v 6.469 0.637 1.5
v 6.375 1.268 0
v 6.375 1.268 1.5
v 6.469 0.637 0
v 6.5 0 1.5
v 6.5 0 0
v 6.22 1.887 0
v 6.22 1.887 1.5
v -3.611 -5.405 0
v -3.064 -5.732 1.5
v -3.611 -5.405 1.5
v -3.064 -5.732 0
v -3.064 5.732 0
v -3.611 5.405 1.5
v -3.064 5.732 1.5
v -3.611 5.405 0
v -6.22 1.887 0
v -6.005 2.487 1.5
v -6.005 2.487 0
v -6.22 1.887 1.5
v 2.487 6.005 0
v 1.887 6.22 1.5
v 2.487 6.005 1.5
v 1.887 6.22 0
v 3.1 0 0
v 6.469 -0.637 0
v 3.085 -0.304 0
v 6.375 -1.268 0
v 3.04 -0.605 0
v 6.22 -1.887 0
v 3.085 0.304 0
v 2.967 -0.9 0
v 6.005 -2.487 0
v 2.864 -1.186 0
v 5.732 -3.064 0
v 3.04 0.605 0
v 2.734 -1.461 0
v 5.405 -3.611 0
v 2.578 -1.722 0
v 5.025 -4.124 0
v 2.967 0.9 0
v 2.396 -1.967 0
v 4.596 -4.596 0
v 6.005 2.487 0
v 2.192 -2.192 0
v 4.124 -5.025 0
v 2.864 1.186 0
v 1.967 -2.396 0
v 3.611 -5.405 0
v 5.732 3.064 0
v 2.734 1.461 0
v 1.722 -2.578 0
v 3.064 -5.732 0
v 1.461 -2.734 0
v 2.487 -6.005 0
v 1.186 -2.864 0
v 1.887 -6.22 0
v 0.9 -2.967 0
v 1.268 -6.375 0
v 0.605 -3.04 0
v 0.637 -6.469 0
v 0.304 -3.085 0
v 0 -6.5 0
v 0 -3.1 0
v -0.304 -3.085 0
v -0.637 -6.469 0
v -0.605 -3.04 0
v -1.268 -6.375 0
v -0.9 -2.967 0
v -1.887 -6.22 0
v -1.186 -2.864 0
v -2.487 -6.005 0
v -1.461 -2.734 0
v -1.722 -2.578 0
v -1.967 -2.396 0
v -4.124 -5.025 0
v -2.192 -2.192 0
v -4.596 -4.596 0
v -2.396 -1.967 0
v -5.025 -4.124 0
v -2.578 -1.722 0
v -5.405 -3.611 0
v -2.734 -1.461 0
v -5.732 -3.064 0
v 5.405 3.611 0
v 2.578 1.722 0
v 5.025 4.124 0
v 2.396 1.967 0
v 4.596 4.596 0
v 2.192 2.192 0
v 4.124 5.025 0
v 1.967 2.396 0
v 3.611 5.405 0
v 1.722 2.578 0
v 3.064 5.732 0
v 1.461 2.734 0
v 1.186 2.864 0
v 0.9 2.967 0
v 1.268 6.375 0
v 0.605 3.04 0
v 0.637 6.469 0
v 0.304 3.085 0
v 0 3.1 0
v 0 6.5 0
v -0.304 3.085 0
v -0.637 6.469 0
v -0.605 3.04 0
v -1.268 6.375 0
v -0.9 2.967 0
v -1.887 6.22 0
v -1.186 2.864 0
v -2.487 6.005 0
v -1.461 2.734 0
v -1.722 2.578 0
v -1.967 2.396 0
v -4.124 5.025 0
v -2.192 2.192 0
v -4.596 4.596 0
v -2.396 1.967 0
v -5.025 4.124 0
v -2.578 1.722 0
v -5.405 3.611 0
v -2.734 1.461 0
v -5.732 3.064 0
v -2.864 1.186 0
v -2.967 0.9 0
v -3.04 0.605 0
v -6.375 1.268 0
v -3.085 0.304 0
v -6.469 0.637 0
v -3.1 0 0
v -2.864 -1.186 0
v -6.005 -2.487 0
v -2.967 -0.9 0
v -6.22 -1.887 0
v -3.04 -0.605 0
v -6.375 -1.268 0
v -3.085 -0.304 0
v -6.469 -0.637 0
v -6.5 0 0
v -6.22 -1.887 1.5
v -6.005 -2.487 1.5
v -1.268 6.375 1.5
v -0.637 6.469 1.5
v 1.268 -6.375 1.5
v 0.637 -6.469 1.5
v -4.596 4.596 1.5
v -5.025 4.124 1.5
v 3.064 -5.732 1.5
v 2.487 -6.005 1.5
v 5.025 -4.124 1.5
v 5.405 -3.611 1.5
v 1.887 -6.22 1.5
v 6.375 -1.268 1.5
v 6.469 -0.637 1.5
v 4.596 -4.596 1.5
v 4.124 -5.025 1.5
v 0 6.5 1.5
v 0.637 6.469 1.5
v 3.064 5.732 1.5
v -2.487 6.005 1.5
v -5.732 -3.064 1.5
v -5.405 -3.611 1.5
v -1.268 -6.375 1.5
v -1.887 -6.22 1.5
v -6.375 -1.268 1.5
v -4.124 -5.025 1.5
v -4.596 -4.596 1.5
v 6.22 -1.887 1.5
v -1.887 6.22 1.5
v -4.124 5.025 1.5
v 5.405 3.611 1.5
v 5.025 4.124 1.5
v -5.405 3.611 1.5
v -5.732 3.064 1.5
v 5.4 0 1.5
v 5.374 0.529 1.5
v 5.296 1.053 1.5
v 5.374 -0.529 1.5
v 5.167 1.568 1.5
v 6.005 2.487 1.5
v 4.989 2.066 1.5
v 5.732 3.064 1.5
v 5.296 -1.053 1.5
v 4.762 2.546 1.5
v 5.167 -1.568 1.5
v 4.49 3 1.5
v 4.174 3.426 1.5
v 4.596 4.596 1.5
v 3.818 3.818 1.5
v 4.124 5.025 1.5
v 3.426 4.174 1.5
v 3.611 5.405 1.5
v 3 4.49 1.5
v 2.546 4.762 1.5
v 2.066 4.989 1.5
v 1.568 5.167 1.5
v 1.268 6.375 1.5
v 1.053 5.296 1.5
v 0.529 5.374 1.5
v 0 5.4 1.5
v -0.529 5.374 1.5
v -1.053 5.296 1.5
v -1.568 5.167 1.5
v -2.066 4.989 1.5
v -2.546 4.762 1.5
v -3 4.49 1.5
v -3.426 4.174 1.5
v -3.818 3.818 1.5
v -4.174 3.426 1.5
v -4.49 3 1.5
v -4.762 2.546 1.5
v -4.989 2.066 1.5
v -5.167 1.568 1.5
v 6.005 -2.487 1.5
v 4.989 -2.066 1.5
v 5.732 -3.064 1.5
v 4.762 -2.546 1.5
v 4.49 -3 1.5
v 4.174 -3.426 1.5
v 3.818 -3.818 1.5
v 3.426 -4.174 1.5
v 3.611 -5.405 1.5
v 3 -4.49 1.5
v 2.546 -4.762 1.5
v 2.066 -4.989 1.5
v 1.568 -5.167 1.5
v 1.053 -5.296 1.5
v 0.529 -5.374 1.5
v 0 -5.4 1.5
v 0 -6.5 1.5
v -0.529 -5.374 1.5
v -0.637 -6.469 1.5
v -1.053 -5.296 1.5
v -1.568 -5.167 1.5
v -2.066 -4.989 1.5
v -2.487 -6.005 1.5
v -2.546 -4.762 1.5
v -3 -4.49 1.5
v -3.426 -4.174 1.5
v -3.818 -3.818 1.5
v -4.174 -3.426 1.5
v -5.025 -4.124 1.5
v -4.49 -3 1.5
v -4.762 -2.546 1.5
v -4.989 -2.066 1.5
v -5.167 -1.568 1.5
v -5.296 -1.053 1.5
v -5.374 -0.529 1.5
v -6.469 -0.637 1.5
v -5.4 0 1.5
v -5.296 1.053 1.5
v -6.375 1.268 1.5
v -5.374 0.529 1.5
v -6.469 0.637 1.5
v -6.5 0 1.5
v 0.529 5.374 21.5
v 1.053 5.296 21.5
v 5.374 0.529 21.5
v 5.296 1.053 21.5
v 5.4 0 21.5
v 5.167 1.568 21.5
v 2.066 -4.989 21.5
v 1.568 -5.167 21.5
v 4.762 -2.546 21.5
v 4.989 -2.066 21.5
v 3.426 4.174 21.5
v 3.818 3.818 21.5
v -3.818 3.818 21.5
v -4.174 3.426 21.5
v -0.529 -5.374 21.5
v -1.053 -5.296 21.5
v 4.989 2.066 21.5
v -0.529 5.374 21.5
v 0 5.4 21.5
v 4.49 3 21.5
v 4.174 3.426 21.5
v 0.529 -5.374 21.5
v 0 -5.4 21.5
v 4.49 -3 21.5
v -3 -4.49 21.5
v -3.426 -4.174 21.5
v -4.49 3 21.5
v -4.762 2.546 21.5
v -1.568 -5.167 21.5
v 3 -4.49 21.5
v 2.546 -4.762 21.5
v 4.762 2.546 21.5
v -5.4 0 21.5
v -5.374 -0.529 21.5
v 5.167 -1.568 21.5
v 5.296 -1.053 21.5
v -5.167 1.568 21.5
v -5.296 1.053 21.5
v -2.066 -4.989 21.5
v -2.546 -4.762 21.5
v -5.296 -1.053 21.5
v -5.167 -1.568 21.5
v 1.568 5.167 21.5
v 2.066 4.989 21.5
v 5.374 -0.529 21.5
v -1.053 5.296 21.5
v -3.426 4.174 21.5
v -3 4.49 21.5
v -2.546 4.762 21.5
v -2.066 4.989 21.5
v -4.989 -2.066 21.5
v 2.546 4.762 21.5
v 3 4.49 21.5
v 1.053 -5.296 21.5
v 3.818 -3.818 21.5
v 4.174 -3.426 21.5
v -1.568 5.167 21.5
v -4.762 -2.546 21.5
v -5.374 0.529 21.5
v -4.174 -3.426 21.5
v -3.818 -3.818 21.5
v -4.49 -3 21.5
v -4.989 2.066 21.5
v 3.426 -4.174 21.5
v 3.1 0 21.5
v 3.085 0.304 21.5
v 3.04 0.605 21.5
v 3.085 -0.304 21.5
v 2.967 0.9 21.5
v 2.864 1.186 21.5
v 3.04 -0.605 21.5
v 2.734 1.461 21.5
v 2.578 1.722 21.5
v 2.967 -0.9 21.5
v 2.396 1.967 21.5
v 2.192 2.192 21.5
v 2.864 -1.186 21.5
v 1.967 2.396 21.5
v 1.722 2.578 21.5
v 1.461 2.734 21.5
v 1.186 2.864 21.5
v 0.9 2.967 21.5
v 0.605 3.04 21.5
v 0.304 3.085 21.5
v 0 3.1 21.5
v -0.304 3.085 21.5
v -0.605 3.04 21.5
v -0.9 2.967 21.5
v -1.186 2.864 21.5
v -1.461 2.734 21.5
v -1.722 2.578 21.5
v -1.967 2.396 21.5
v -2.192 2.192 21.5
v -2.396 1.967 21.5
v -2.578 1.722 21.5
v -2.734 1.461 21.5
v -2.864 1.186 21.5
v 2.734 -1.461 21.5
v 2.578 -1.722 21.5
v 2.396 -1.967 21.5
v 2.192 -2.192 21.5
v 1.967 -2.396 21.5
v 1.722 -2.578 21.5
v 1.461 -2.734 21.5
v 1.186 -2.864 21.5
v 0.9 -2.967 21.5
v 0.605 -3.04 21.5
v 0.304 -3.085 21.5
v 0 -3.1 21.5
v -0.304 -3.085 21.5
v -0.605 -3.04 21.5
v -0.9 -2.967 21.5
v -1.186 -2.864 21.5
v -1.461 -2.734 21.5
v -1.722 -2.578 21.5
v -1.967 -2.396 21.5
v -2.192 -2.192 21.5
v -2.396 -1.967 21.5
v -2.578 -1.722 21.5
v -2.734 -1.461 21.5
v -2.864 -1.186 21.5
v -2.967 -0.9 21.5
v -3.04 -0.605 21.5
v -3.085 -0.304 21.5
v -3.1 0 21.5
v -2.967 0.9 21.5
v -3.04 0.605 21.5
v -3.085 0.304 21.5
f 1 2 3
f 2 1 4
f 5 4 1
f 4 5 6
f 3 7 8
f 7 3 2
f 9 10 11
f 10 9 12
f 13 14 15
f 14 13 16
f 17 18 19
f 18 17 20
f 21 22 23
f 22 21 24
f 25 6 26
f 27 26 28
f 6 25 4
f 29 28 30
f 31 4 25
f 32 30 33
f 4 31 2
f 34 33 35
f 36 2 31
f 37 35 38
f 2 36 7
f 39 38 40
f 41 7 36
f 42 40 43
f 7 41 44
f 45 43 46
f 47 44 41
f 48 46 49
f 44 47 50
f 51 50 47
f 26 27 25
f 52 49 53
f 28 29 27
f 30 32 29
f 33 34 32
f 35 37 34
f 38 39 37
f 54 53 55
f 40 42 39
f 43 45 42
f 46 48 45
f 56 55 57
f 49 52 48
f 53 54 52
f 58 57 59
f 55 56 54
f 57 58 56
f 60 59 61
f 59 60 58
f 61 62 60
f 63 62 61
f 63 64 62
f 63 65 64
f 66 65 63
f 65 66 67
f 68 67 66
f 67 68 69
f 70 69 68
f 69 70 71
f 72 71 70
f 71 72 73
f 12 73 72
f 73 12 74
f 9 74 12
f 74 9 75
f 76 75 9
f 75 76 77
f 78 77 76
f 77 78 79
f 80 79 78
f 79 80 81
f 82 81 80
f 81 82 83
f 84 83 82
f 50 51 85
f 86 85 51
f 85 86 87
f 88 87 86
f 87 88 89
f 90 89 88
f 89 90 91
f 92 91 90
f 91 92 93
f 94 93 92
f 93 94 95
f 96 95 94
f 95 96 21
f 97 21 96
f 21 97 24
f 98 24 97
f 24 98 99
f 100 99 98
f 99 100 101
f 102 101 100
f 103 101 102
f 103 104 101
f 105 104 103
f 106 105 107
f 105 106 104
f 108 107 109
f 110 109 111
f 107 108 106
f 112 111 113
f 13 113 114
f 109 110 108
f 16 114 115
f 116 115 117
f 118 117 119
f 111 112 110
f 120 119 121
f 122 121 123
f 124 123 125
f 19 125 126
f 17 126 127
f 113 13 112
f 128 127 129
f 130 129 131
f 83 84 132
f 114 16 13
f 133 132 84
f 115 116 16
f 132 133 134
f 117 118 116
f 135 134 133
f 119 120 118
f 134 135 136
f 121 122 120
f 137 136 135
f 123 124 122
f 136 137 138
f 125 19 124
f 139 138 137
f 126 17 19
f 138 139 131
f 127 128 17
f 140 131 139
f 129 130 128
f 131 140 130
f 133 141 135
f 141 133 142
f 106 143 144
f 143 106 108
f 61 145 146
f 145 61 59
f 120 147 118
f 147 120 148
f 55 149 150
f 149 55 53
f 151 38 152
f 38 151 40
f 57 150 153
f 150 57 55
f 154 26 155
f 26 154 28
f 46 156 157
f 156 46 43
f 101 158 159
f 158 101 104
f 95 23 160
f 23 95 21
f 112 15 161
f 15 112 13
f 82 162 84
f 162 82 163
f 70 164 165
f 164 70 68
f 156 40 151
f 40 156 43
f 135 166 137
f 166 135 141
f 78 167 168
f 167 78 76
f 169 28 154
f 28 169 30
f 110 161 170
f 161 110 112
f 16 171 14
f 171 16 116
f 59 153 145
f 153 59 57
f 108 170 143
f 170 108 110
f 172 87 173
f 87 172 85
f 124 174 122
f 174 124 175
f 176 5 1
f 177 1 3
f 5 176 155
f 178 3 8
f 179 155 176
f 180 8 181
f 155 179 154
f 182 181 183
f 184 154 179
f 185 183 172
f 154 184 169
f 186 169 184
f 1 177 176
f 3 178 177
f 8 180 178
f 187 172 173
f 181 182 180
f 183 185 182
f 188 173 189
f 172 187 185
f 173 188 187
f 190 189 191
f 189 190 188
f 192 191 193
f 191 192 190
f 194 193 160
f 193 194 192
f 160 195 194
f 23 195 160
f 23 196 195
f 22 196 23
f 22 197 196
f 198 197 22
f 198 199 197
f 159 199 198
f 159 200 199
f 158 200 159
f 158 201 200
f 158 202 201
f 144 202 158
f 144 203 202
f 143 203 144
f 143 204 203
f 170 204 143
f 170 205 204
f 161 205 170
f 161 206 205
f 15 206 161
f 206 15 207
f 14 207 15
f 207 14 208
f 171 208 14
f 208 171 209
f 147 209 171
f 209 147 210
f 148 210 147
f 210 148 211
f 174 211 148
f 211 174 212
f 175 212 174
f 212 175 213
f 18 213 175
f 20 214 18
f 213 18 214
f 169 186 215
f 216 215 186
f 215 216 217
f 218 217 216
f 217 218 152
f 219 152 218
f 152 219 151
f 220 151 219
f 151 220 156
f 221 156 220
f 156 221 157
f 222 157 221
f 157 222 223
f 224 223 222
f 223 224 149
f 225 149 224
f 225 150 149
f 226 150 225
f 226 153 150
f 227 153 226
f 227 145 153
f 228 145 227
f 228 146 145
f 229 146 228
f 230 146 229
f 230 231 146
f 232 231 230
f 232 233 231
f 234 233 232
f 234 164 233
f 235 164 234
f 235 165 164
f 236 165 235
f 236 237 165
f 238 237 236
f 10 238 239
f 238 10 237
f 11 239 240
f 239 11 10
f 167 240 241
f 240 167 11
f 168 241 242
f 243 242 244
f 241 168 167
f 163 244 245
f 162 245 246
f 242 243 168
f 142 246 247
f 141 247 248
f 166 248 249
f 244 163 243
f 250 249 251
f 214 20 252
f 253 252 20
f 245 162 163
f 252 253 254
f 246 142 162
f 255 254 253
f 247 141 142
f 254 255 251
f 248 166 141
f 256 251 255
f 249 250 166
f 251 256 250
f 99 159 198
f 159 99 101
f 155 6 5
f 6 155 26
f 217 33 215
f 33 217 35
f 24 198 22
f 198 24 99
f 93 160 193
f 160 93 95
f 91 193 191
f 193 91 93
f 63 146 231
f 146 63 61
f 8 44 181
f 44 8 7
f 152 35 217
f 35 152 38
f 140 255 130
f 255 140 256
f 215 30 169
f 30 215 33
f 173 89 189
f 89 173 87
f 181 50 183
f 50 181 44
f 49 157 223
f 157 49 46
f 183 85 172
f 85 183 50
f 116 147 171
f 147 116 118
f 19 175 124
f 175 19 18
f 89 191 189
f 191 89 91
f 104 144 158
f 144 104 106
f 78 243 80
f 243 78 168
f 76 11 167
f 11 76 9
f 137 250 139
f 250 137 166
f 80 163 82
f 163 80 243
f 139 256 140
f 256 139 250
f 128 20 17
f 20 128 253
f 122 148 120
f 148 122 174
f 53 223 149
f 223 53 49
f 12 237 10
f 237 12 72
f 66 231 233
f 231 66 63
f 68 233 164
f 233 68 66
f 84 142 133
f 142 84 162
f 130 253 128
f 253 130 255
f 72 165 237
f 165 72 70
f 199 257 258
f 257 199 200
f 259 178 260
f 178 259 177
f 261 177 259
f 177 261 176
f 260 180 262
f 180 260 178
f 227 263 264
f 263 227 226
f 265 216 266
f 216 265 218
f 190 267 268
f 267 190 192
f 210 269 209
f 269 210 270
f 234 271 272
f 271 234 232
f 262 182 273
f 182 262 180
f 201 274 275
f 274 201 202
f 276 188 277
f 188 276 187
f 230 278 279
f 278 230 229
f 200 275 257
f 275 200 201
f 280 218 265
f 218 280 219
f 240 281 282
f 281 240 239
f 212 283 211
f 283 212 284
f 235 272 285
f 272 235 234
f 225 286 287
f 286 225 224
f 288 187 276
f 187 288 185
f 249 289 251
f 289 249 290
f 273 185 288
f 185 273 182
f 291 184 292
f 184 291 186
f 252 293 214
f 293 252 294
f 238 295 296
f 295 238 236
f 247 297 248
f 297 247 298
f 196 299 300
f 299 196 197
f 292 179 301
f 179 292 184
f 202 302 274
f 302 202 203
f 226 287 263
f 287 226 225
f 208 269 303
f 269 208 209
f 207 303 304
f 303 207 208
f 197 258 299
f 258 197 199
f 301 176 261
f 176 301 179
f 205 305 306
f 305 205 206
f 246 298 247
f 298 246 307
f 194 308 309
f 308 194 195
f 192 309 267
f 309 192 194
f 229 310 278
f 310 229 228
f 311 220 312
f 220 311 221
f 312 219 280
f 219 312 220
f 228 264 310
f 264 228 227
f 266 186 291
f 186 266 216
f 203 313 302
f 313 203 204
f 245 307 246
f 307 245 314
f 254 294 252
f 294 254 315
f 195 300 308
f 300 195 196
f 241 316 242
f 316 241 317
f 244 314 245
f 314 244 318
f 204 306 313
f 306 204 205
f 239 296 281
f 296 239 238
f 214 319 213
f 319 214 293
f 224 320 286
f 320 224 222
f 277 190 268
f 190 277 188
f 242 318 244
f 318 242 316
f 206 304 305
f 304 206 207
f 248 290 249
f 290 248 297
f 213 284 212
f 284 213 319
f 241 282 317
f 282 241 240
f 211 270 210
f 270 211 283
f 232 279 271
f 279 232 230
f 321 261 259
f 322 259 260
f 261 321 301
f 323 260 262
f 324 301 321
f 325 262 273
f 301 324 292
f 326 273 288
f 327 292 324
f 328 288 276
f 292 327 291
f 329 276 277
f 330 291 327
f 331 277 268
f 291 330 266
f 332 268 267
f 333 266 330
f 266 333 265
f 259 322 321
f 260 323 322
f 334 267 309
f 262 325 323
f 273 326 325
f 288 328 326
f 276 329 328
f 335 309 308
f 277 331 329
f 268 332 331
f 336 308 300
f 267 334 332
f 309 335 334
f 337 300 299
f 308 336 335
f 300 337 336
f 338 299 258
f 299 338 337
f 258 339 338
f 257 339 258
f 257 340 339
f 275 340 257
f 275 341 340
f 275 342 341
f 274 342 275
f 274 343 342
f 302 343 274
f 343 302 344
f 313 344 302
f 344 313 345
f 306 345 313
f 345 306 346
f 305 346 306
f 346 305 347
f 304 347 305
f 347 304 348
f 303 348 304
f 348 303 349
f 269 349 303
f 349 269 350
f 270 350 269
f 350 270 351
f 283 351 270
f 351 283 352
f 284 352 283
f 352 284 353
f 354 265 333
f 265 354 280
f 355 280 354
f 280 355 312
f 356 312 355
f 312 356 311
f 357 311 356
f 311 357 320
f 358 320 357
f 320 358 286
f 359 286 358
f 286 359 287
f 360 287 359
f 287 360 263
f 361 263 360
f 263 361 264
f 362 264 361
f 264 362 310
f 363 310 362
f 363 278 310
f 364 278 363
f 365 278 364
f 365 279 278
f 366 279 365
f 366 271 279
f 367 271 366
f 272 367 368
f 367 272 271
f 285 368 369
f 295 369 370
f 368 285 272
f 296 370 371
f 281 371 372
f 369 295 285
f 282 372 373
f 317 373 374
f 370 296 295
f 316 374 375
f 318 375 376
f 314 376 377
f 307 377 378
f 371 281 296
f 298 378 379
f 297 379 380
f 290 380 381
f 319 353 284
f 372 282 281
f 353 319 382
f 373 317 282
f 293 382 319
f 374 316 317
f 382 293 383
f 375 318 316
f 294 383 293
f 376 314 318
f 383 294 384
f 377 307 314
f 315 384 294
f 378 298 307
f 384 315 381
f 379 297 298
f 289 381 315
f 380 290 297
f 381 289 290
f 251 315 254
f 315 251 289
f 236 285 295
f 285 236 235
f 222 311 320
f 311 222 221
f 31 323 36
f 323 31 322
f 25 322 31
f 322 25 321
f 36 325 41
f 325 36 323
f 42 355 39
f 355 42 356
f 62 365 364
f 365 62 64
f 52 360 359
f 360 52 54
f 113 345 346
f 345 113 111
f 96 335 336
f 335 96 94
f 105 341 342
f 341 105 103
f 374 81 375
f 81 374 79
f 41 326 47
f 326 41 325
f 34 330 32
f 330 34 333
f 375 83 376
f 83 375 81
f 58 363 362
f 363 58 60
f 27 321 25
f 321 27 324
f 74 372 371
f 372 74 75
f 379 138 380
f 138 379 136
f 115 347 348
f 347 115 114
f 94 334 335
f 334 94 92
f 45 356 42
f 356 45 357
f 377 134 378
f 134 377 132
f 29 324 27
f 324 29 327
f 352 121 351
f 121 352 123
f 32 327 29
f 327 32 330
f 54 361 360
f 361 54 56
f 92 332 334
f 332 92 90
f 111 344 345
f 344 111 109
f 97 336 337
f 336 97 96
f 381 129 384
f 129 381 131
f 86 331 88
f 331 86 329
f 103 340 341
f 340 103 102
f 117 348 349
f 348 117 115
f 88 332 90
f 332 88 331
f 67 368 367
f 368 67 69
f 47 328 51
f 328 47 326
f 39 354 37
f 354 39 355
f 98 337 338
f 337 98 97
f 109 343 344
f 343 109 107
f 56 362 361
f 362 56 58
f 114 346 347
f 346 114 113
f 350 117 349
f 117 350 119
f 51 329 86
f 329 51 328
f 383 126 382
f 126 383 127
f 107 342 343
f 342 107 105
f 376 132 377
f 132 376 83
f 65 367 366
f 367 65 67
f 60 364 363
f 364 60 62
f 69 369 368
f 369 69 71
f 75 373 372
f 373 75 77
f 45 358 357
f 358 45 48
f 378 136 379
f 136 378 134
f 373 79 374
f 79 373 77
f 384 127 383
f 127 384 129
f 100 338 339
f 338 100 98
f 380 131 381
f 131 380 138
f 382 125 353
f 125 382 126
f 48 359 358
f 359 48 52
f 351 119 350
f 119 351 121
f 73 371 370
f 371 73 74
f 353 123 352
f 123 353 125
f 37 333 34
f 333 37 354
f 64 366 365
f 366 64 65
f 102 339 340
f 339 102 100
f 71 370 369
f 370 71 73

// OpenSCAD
// Adapter sleeve for 0.2 mL PCR tubes in 1.5 mL rack holes.
// Designed to be printed upside down (collar on the bed).

collar_d = 13.0;      // Diameter of the base collar
collar_t = 1.5;       // Thickness of the base collar
sleeve_d = 10.8;      // Outer diameter of the main sleeve body
total_h  = 21.5;      // Total height from the bed to the top of the sleeve
bore_d   = 6.2;       // Diameter of the central bore

$fn = 64;

// The part is modeled sitting on the XY plane (z=0)
// The collar is the base, and the sleeve rises from it.

difference() {
    // Main Body: Union of the collar and the sleeve cylinder
    union() {
        // The collar (base)
        cylinder(h = collar_t, d = collar_d);
        
        // The sleeve body (rising from the collar)
        // Note: The sleeve body height is total_h - collar_t
        translate([0, 0, collar_t])
            cylinder(h = total_h - collar_t, d = sleeve_d);
    }

    // The Bore: A straight hole through the entire height
    // We extend the cylinder slightly beyond the top and bottom to ensure a clean cut
    translate([0, 0, -1])
        cylinder(h = total_h + 2, d = bore_d);
}
